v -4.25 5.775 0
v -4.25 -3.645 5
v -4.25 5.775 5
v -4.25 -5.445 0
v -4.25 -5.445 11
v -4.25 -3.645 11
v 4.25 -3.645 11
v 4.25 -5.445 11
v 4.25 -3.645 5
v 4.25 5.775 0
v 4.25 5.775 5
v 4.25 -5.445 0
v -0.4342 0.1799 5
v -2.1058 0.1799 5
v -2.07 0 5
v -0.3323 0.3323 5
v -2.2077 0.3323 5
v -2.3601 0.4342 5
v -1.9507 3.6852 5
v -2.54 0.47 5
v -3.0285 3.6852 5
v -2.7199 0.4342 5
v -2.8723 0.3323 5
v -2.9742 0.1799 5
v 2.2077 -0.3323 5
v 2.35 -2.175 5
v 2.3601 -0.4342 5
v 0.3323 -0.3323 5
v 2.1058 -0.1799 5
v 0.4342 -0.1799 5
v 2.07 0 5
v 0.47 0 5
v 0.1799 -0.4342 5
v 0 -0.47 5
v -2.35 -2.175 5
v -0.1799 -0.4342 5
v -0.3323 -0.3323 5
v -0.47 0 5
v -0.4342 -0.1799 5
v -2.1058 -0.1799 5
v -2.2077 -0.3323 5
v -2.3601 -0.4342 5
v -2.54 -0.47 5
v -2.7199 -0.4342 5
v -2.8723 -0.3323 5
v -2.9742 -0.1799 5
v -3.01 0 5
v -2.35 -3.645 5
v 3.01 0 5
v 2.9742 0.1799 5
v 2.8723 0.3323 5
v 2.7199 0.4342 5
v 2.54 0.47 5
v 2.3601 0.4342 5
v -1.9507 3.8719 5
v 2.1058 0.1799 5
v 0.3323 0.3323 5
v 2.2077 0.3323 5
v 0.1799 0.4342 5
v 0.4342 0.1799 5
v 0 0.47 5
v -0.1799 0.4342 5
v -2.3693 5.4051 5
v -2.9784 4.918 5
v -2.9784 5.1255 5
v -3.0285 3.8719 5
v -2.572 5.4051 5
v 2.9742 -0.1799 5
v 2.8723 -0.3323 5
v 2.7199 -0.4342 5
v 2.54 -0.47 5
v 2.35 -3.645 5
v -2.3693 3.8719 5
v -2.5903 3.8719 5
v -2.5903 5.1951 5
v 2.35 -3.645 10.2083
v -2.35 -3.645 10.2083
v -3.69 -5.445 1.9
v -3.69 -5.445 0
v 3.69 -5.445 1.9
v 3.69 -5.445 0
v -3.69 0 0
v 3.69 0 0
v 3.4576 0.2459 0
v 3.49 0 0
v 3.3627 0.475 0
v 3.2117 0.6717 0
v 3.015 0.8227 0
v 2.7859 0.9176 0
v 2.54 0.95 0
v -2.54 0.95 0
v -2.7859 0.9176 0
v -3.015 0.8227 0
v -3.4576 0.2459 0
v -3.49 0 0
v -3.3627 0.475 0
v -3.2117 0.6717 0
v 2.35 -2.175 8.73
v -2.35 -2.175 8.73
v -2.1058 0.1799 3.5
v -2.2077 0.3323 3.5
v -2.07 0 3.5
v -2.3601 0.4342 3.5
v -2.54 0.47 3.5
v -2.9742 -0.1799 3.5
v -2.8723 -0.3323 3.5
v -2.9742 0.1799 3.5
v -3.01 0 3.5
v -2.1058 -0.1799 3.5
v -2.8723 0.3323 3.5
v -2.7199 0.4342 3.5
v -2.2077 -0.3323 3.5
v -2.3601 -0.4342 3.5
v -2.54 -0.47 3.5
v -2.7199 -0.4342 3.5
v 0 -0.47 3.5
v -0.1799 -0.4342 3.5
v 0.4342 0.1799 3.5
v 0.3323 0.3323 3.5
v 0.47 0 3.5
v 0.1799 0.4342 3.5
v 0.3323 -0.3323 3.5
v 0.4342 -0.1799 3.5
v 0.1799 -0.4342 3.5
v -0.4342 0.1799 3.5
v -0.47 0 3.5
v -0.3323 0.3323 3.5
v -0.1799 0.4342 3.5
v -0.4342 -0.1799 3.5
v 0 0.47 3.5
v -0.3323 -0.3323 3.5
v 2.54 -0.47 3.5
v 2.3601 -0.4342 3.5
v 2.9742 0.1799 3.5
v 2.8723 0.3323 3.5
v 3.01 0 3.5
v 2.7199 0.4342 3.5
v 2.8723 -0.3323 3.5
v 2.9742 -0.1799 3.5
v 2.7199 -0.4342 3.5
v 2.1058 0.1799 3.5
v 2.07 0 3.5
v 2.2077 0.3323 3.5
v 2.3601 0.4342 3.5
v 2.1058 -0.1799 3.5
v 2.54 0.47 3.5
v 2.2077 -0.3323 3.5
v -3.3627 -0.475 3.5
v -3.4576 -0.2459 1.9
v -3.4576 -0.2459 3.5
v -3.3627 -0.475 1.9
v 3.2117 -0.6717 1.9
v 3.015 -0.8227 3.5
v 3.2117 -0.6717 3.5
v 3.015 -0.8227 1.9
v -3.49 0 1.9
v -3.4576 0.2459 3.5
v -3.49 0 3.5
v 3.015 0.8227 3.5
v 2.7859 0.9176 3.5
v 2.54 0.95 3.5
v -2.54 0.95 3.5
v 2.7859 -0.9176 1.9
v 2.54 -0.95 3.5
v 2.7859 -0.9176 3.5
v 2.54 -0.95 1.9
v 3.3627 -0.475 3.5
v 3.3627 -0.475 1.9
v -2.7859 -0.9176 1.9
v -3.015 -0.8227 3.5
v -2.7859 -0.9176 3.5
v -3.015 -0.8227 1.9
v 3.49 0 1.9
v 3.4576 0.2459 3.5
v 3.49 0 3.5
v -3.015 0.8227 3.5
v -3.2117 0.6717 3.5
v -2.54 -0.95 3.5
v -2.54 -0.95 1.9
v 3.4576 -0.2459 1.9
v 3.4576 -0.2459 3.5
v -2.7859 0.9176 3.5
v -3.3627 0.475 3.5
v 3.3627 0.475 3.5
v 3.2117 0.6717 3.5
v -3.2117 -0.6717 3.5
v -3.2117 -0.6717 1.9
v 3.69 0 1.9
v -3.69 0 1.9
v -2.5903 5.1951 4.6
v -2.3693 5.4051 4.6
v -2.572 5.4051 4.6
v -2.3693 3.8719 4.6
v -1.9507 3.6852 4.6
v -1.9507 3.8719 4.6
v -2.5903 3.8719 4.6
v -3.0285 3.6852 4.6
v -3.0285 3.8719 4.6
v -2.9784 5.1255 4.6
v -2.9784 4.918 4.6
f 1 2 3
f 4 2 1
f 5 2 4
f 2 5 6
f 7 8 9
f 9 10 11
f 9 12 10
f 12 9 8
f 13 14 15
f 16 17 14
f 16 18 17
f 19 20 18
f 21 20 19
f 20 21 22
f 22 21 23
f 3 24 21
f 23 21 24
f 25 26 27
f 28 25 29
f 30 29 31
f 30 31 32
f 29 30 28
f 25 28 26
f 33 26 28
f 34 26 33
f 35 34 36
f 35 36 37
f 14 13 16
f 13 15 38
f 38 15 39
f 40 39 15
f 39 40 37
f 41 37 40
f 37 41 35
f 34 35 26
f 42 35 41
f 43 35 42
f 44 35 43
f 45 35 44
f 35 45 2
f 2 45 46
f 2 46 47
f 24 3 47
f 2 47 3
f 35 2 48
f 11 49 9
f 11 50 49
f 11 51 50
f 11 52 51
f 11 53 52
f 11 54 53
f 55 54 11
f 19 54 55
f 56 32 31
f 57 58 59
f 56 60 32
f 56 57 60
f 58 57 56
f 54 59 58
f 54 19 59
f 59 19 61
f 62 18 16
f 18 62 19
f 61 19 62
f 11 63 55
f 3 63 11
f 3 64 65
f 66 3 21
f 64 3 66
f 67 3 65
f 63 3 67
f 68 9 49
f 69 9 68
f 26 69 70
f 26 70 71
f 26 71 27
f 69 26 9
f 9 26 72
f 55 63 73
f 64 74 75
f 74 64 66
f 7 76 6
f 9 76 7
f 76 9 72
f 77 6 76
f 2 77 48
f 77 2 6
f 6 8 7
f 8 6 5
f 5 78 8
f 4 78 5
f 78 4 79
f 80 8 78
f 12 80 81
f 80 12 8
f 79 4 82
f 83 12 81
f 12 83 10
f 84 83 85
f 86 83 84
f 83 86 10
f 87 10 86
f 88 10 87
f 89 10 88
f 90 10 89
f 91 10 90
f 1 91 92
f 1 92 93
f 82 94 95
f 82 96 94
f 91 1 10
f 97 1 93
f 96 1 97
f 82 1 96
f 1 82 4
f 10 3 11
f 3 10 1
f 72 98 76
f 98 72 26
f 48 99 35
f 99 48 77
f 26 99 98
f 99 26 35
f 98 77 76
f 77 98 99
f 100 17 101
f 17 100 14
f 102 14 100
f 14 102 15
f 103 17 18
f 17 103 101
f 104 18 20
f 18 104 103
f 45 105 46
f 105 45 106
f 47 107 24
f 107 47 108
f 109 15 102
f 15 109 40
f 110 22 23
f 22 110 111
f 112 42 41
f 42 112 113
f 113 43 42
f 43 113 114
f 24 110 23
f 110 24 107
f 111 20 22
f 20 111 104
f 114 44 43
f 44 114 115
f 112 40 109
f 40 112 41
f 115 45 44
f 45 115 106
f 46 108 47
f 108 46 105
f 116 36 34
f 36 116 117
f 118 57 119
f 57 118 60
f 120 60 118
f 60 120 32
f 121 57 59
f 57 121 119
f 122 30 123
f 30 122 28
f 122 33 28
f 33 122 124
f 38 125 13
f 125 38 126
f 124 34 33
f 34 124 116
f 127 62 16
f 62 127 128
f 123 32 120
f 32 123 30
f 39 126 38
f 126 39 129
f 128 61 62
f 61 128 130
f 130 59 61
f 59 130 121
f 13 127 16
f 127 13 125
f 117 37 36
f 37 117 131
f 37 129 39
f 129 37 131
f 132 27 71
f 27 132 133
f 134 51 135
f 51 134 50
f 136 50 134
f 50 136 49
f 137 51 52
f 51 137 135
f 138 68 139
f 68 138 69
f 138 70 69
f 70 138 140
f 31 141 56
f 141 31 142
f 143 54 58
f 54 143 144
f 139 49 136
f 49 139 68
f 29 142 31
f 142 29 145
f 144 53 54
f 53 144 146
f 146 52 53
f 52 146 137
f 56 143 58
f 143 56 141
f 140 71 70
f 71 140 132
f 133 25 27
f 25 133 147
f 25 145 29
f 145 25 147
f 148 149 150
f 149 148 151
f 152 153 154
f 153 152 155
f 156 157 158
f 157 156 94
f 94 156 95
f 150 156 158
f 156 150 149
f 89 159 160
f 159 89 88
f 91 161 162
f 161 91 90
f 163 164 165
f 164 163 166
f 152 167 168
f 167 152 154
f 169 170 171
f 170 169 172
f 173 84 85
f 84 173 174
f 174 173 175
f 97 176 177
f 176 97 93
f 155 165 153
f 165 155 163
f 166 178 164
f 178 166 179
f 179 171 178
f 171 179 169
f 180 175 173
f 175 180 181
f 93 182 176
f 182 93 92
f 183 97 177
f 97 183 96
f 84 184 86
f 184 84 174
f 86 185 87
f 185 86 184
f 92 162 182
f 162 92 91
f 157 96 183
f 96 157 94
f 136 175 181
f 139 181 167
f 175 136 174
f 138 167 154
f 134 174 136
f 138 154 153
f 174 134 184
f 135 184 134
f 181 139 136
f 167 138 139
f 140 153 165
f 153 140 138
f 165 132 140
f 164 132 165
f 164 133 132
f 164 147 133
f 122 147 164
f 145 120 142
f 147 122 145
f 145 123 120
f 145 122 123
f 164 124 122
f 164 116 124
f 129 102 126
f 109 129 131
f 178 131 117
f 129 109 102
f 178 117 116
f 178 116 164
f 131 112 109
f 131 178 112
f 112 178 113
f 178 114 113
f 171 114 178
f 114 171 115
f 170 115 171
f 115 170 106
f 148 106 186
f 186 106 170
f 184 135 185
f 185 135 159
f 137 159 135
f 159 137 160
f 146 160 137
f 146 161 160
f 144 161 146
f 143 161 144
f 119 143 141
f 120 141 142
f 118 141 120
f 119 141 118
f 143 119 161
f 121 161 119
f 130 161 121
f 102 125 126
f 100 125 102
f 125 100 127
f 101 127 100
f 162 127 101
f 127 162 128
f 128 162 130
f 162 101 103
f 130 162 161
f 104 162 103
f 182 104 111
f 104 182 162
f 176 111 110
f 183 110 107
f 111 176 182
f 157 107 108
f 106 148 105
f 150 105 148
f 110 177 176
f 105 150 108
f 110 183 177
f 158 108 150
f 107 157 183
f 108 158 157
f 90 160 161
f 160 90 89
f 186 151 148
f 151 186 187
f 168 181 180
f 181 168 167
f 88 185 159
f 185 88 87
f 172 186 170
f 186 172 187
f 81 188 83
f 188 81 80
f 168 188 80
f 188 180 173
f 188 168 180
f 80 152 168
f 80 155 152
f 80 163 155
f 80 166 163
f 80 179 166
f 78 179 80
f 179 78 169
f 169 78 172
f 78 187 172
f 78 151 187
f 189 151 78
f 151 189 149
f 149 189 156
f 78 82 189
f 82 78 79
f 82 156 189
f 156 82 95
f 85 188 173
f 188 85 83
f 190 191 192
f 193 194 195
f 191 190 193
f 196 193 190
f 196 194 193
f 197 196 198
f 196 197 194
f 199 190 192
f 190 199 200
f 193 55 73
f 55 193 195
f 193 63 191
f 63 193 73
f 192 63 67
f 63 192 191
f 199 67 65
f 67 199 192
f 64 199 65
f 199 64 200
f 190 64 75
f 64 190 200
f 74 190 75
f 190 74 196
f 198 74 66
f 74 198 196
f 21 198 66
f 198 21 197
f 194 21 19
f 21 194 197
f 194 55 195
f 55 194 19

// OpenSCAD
// SPDX-FileCopyrightText: 2026 Alon A. Rabinowitz
// SPDX-License-Identifier: CC-BY-4.0

// The male, 3 pins, as it prints. Everything is in fan-connector.scad; this file only picks the part.
include <fan-connector.scad>
part = "male";
pins = 3;
